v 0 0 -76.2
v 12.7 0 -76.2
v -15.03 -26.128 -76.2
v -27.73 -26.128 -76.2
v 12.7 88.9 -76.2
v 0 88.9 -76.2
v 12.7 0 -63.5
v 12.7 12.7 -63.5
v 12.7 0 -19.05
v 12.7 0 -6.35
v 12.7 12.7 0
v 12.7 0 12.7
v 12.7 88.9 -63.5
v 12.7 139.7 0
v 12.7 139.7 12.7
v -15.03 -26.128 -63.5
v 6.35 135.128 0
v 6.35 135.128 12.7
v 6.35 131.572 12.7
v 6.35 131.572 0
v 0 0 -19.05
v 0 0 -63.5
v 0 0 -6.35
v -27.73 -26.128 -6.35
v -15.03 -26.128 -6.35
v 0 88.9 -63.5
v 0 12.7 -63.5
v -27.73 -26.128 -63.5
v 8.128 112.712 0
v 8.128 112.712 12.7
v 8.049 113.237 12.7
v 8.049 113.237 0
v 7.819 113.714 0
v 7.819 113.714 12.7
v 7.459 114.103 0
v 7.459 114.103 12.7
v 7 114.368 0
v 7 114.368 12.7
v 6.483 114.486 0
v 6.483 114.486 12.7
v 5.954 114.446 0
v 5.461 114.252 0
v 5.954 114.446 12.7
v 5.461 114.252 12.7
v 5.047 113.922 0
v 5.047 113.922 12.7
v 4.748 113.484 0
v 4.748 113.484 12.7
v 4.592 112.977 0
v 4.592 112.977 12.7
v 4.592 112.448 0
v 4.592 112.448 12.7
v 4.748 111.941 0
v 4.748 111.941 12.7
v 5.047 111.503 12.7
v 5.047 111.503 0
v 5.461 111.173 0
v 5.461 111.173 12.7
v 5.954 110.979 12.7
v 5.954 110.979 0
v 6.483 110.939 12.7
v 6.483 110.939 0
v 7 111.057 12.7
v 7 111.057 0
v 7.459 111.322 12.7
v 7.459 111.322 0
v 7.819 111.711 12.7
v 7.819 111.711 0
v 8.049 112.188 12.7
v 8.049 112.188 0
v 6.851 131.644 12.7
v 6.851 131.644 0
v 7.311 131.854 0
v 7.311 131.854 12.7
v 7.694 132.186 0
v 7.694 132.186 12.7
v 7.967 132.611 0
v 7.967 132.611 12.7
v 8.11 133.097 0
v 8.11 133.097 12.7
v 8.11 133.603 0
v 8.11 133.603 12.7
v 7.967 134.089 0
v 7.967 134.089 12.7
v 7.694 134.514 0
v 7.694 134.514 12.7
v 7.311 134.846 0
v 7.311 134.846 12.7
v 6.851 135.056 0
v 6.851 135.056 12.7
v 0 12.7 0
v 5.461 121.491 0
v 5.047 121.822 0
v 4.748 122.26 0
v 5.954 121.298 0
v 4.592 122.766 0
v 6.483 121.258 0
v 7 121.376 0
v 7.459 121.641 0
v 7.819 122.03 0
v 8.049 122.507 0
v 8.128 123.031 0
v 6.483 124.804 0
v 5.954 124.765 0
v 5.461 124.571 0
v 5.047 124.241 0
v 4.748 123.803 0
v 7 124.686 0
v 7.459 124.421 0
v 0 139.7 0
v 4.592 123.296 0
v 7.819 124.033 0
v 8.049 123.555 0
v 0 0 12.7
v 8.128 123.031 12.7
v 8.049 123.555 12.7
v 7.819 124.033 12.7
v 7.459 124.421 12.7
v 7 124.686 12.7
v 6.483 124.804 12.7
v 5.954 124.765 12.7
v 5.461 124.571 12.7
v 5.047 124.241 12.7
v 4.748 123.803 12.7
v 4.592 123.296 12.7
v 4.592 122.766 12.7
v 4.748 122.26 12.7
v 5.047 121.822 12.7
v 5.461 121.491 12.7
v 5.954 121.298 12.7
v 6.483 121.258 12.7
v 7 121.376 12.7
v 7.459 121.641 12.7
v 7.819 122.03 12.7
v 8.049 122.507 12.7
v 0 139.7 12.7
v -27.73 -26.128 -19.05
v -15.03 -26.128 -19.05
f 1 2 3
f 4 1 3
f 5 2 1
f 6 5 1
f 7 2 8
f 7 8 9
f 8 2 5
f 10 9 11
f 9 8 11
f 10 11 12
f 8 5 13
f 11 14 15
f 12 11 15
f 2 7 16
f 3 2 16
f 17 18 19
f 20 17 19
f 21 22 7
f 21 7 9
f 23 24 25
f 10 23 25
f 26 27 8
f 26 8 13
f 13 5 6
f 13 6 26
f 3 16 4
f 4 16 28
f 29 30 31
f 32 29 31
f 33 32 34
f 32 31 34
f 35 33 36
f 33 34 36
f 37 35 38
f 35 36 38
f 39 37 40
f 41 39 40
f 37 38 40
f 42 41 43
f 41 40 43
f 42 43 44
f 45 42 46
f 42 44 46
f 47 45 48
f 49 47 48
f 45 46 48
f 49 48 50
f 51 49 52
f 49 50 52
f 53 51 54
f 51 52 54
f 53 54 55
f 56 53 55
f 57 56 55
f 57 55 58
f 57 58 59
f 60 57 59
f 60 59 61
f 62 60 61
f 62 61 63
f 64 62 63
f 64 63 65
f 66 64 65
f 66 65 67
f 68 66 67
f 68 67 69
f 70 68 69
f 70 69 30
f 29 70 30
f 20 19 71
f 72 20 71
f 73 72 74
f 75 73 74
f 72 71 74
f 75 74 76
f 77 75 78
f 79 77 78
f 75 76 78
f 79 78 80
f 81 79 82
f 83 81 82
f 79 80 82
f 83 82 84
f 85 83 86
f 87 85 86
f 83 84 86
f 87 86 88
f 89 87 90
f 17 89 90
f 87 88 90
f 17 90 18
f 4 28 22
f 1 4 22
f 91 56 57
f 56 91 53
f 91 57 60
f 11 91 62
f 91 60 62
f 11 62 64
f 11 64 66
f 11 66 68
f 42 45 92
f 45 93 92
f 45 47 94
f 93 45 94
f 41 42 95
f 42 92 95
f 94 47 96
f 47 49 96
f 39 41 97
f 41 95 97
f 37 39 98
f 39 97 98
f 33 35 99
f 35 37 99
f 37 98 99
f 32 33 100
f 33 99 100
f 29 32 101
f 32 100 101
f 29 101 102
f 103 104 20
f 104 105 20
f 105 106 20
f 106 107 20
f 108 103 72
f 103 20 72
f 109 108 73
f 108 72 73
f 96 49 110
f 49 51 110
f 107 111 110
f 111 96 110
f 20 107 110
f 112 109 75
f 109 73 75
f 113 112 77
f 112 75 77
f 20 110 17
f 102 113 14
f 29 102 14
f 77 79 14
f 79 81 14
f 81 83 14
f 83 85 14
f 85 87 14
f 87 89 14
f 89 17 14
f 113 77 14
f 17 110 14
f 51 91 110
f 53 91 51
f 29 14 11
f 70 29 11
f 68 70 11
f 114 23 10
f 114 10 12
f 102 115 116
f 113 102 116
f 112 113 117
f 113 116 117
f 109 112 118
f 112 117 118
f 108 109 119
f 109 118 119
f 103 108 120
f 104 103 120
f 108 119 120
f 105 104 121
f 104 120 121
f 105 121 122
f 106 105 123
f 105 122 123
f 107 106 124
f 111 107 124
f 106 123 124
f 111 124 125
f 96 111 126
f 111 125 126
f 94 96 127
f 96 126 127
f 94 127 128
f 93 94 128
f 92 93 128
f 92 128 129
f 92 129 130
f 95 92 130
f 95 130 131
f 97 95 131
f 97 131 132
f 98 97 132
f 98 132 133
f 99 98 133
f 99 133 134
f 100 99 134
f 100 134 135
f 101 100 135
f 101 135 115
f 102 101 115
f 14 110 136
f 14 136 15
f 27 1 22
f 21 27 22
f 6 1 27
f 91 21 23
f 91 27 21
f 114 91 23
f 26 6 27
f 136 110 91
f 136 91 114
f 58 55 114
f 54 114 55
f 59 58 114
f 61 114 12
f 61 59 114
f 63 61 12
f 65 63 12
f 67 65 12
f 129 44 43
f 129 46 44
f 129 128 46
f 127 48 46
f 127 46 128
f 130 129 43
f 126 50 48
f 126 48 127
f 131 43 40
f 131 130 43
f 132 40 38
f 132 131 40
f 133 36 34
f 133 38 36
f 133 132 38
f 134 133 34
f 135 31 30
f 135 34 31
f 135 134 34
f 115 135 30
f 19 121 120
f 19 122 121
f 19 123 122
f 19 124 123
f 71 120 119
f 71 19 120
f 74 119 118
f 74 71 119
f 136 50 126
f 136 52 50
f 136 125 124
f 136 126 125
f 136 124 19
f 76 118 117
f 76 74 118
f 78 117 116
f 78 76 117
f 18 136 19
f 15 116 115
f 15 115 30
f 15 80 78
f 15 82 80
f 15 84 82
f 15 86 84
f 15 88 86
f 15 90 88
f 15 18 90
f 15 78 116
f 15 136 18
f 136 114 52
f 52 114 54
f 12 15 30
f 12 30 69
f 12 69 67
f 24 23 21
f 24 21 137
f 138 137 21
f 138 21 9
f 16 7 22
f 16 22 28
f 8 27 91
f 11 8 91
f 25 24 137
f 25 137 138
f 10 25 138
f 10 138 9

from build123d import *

# Parameters (mm, degrees)
SKETCH1_W           = 12.7
SKETCH1_H           = 139.7
BOSS_EXTRUDE1_DEPTH = 12.7
SKETCH2_W           = 63.5
SKETCH2_H           = 12.7
BOSS_EXTRUDE2_DEPTH = 12.7
SKETCH3_W           = 12.7
SKETCH3_H           = 88.9
BOSS_EXTRUDE3_DEPTH = 12.7
SKETCH6_R           = 1.778
CUT_EXTRUDE1_DEPTH  = 89.9
BOSS_EXTRUDE7_START = -19.05
BOSS_EXTRUDE7_DEPTH = 12.7
BOSS_EXTRUDE8_START = 44.45
BOSS_EXTRUDE8_DEPTH = 12.7


with BuildPart() as part:
    # Sketch1 → Boss-Extrude1 (new body)
    with BuildSketch(Plane.XY):
        with Locations((6.35, 69.85)):
            Rectangle(SKETCH1_W, SKETCH1_H)
    extrude(amount=BOSS_EXTRUDE1_DEPTH)

    # Sketch2 → Boss-Extrude2 (add)
    with BuildSketch(Plane.ZY):
        with Locations((-31.75, 6.35)):
            Rectangle(SKETCH2_W, SKETCH2_H)
    extrude(amount=-BOSS_EXTRUDE2_DEPTH)

    # Sketch3 → Boss-Extrude3 (add)
    with BuildSketch(Plane.ZY):
        with Locations((-69.85, 44.45)):
            Rectangle(SKETCH3_W, SKETCH3_H)
    extrude(amount=-BOSS_EXTRUDE3_DEPTH)

    # Sketch6 → Cut-Extrude1 (cut, through all)
    with BuildSketch(Plane.XY.offset(12.7)):
        with BuildLine():
            ThreePointArc((6.35, 131.572), (8.128, 133.35), (6.35, 135.128))
            Line((6.35, 135.128), (6.35, 131.572))
        make_face()
        with Locations((6.35, 112.7125)):
            Circle(SKETCH6_R)
        with Locations((6.35, 123.03125)):
            Circle(SKETCH6_R)
    extrude(amount=-CUT_EXTRUDE1_DEPTH, mode=Mode.SUBTRACT)

    # Sketch7 → Boss-Extrude7 (add)
    with BuildSketch(Plane.XY.offset(12.7).offset(BOSS_EXTRUDE7_START)):
        Polygon((0, 0), (-27.729644095, -26.128085241), (-15.029644095, -26.128085241), (12.7, 0), align=None)
    extrude(amount=-BOSS_EXTRUDE7_DEPTH)

    # Sketch10 → Boss-Extrude8 (add)
    with BuildSketch(Plane(origin=(0, 0, -19.05), x_dir=(-1, 0, 0), z_dir=(0, 0, -1)).offset(BOSS_EXTRUDE8_START)):
        Polygon((-12.7, 0), (15.029644095, -26.128085241), (27.729644095, -26.128085241), (0, 0), align=None)
    extrude(amount=BOSS_EXTRUDE8_DEPTH)


solid = part.part
